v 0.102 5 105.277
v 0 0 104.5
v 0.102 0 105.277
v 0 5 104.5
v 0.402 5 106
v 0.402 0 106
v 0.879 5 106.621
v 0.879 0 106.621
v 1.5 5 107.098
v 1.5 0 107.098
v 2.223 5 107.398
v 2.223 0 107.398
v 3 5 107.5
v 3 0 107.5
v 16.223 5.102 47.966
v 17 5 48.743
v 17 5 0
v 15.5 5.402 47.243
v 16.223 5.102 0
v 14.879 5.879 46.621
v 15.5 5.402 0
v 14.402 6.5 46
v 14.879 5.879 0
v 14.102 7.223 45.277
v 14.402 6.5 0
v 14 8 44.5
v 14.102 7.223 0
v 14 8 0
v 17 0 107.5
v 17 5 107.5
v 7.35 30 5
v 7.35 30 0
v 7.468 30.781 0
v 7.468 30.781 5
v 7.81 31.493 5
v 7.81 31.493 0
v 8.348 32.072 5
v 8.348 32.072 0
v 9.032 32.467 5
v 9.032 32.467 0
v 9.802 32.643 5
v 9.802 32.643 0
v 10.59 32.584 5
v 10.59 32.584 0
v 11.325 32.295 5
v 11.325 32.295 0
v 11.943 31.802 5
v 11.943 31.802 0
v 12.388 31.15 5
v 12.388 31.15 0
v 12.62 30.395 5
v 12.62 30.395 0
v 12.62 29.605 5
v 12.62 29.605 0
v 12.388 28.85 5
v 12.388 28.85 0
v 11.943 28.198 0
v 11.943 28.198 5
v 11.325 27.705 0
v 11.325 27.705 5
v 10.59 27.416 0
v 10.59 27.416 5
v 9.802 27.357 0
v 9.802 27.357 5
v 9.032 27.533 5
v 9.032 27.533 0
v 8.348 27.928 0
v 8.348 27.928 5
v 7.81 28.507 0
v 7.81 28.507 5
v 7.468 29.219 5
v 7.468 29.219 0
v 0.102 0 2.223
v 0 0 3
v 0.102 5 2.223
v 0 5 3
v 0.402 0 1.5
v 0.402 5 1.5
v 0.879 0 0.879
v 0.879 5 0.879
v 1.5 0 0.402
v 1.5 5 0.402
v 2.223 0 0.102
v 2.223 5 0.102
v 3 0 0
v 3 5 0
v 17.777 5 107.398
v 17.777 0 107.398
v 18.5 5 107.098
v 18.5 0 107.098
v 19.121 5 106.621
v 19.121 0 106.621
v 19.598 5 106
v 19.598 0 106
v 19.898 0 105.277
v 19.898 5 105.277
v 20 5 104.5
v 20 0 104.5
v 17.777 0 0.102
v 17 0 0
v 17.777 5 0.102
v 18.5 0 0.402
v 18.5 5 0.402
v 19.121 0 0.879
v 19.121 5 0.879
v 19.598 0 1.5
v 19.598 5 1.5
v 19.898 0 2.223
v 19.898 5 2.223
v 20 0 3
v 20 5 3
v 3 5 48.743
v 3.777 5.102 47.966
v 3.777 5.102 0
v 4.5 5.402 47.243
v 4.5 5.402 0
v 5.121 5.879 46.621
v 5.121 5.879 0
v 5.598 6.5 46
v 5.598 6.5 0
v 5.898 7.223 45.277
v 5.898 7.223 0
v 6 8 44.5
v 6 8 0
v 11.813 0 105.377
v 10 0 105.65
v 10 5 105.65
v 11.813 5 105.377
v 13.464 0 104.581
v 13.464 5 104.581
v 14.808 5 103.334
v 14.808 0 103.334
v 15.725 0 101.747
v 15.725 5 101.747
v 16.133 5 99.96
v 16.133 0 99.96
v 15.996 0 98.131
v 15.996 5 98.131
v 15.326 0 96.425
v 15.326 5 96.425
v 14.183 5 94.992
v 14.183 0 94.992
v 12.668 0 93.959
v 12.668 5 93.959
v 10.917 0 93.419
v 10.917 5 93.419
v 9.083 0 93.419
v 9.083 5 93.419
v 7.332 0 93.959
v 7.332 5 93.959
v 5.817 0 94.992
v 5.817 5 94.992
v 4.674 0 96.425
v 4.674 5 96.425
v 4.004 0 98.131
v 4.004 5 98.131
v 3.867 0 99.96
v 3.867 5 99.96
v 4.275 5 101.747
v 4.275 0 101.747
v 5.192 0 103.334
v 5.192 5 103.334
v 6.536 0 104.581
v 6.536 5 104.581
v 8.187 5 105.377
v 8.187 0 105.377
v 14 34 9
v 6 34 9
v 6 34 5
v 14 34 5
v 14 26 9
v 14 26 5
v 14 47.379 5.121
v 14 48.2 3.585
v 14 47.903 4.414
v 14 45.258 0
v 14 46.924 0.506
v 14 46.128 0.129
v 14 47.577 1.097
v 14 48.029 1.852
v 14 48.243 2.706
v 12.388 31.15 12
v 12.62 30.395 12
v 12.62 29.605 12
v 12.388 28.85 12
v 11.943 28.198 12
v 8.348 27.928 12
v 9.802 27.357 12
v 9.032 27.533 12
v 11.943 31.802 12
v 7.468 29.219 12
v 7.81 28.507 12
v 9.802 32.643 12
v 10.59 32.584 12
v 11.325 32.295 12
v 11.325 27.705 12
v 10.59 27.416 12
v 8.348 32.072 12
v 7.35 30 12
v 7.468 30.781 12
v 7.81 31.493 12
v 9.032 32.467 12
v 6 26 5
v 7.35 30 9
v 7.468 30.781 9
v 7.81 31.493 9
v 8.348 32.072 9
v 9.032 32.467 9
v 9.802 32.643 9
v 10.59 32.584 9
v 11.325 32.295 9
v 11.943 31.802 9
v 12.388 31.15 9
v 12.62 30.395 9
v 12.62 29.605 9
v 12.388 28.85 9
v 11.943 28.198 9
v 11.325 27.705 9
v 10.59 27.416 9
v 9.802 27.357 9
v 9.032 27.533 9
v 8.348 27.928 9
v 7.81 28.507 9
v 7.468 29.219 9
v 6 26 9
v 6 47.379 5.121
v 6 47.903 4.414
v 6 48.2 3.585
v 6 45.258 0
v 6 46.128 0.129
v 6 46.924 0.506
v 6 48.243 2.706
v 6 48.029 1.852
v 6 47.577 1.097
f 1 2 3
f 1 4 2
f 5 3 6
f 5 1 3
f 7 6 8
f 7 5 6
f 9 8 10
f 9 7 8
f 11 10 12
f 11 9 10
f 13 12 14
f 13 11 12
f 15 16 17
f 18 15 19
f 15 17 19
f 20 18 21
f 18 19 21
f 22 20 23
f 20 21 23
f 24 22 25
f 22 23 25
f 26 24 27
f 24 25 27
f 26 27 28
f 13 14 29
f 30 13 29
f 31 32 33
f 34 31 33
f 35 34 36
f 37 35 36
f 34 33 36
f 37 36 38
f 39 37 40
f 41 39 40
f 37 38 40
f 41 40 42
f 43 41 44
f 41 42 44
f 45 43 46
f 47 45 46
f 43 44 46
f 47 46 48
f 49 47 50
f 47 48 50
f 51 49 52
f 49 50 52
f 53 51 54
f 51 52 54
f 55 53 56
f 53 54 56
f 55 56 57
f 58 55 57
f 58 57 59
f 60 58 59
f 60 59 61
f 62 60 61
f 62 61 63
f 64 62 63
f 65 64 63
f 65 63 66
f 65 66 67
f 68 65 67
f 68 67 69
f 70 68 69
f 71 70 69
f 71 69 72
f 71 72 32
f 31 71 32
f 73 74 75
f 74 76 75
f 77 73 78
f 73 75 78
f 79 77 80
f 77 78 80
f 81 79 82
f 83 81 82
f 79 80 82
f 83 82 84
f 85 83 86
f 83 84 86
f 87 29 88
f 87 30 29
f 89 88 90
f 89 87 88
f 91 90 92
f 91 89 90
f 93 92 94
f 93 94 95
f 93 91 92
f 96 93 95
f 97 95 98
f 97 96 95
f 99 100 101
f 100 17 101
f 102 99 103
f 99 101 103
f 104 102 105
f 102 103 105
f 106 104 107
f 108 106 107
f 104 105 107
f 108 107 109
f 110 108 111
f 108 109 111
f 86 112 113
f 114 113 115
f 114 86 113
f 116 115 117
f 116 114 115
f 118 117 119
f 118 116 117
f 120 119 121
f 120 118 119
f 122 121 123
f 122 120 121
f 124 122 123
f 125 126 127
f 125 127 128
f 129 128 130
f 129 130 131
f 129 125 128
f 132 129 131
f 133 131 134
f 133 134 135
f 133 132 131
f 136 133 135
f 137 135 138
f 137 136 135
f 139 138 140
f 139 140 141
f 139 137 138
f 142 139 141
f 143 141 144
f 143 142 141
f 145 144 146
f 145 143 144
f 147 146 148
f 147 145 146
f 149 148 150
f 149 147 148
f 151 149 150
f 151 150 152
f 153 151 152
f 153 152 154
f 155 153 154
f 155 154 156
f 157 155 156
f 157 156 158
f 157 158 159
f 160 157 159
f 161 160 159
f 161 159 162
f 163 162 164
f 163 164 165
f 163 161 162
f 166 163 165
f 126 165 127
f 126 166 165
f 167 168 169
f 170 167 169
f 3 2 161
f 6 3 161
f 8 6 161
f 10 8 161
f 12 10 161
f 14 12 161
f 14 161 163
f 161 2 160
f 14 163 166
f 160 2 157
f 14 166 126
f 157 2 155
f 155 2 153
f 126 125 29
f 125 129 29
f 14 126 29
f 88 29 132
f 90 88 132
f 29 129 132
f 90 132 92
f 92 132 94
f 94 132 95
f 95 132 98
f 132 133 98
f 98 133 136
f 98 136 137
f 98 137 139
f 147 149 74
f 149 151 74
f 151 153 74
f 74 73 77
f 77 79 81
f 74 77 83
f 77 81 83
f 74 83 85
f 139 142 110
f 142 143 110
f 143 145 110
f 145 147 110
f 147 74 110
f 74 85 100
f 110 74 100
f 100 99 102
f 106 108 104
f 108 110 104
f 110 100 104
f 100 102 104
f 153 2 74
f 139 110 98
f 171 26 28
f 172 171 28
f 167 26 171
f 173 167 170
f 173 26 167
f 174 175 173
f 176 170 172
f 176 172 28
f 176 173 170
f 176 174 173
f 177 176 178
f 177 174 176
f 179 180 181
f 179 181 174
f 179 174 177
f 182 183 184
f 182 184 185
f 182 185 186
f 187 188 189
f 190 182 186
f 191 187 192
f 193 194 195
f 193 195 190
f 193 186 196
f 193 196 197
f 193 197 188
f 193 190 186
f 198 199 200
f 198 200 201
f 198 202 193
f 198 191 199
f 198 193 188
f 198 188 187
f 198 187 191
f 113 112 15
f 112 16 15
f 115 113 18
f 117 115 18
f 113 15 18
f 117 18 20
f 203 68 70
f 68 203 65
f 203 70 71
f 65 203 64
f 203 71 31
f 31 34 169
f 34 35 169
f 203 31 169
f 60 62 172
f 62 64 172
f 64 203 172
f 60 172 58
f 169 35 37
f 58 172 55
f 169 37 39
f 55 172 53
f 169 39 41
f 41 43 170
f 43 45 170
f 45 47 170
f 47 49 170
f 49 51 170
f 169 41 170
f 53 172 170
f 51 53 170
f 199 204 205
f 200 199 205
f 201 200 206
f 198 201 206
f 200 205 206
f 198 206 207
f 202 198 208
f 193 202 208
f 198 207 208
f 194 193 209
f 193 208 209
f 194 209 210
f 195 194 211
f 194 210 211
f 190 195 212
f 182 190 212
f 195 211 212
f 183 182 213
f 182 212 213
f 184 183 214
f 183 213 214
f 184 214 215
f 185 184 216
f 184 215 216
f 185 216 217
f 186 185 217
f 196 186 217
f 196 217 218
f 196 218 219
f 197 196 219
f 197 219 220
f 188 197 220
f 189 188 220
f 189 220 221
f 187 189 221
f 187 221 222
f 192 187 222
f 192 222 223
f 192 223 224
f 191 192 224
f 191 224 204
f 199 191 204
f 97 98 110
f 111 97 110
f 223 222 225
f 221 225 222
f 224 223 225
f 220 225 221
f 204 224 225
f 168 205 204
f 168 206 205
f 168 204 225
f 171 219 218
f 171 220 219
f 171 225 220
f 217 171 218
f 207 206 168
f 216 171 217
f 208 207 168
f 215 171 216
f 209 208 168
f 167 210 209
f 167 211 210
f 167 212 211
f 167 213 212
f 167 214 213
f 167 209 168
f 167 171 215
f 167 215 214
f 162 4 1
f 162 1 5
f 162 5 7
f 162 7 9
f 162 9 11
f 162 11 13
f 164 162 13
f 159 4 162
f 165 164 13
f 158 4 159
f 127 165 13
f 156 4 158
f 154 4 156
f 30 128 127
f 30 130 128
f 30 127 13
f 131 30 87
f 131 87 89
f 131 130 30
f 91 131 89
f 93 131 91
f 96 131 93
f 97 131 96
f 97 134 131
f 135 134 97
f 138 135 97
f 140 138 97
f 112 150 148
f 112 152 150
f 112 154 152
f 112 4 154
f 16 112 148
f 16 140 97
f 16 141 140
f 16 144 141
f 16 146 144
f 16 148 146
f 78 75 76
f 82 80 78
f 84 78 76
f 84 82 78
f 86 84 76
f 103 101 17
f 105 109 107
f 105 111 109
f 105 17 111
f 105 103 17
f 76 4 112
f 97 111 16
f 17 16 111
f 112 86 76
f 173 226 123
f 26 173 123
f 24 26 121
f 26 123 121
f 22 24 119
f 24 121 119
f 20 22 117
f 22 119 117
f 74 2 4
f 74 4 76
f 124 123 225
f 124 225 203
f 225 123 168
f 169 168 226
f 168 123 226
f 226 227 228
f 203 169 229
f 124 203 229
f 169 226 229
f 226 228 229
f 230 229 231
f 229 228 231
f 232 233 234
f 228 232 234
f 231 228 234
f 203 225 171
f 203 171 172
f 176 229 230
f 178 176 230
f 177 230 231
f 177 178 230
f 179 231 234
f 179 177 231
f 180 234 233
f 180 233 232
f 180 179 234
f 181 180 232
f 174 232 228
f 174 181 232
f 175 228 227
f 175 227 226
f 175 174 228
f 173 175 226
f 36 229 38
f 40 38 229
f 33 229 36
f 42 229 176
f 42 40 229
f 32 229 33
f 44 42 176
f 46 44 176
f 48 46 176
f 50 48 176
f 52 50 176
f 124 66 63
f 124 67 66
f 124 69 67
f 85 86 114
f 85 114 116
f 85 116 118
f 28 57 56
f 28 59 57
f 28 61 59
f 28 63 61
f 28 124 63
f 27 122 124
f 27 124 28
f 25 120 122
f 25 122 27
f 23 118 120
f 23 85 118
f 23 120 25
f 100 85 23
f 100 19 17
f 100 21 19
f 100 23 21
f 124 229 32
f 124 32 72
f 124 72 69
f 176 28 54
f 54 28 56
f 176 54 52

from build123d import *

# Parameters (mm, degrees)
SKETCH3_W                = 20
SKETCH3_H                = 107.5
SKETCH3_R                = 6.15
BOSS_EXTRUDE2_DEPTH      = 5
BOSS_EXTRUDE3_DEPTH      = 4
BOSS_EXTRUDE3_DEPTH_BACK = 4
SKETCH5_R                = 2.65
CUT_EXTRUDE1_DEPTH       = 12
SKETCH6_W                = 4
SKETCH6_H                = 8
CUT_EXTRUDE2_DEPTH       = 121.451234946
FILLET1_R                = 3


with BuildPart() as part:
    # Sketch3 → Boss-Extrude2 (new body)
    with BuildSketch(Plane(origin=(0, 0, 0), x_dir=(1, 0, 0), z_dir=(0, 1, 0))):
        with Locations((10, -53.75)):
            Rectangle(SKETCH3_W, SKETCH3_H)
        with Locations(Location((10, -99.5, 0), (0, 0, 270))):
            Circle(SKETCH3_R, mode=Mode.SUBTRACT)
    extrude(amount=BOSS_EXTRUDE2_DEPTH)

    # Sketch4 → Boss-Extrude3 (add, two sides: drawn at the far end of the back side and taken through both)
    with BuildSketch(Plane(origin=(10, 0, 0), x_dir=(0, 0, -1), z_dir=(1, 0, 0)).offset(-BOSS_EXTRUDE3_DEPTH_BACK)):
        Polygon((0, 5), (0, 52.5), (-47.5, 5), align=None)
    extrude(amount=BOSS_EXTRUDE3_DEPTH + BOSS_EXTRUDE3_DEPTH_BACK)

    # Sketch5 → Cut-Extrude1 (cut)
    with BuildSketch(Plane(origin=(0, 0, 0), x_dir=(-1, 0, 0), z_dir=(0, 0, -1))):
        with Locations((-10, 30)):
            Circle(SKETCH5_R)
    extrude(amount=-CUT_EXTRUDE1_DEPTH, mode=Mode.SUBTRACT)

    # Sketch6 → Cut-Extrude2 (cut, through all)
    with BuildSketch(Plane(origin=(14, 0, 0), x_dir=(0, 0, -1), z_dir=(1, 0, 0))):
        with Locations((-7, 30)):
            Rectangle(SKETCH6_W, SKETCH6_H)
    extrude(amount=-CUT_EXTRUDE2_DEPTH, mode=Mode.SUBTRACT)

    # Fillet1
    fillet1_edges = [part.edges().sort_by_distance(p)[0] for p in [
        (20, 2.5, 107.5),
        (0, 2.5, 107.5),
        (6, 5, 23.75),
        (10, 5, 47.5),
        (14, 5, 23.75),
        (10, 52.5, 0),
        (20, 2.5, 0),
        (0, 2.5, 0),
    ]]
    fillet(fillet1_edges, radius=FILLET1_R - 0.0001)  # a hair under: the kernel refuses the full size


solid = part.part
